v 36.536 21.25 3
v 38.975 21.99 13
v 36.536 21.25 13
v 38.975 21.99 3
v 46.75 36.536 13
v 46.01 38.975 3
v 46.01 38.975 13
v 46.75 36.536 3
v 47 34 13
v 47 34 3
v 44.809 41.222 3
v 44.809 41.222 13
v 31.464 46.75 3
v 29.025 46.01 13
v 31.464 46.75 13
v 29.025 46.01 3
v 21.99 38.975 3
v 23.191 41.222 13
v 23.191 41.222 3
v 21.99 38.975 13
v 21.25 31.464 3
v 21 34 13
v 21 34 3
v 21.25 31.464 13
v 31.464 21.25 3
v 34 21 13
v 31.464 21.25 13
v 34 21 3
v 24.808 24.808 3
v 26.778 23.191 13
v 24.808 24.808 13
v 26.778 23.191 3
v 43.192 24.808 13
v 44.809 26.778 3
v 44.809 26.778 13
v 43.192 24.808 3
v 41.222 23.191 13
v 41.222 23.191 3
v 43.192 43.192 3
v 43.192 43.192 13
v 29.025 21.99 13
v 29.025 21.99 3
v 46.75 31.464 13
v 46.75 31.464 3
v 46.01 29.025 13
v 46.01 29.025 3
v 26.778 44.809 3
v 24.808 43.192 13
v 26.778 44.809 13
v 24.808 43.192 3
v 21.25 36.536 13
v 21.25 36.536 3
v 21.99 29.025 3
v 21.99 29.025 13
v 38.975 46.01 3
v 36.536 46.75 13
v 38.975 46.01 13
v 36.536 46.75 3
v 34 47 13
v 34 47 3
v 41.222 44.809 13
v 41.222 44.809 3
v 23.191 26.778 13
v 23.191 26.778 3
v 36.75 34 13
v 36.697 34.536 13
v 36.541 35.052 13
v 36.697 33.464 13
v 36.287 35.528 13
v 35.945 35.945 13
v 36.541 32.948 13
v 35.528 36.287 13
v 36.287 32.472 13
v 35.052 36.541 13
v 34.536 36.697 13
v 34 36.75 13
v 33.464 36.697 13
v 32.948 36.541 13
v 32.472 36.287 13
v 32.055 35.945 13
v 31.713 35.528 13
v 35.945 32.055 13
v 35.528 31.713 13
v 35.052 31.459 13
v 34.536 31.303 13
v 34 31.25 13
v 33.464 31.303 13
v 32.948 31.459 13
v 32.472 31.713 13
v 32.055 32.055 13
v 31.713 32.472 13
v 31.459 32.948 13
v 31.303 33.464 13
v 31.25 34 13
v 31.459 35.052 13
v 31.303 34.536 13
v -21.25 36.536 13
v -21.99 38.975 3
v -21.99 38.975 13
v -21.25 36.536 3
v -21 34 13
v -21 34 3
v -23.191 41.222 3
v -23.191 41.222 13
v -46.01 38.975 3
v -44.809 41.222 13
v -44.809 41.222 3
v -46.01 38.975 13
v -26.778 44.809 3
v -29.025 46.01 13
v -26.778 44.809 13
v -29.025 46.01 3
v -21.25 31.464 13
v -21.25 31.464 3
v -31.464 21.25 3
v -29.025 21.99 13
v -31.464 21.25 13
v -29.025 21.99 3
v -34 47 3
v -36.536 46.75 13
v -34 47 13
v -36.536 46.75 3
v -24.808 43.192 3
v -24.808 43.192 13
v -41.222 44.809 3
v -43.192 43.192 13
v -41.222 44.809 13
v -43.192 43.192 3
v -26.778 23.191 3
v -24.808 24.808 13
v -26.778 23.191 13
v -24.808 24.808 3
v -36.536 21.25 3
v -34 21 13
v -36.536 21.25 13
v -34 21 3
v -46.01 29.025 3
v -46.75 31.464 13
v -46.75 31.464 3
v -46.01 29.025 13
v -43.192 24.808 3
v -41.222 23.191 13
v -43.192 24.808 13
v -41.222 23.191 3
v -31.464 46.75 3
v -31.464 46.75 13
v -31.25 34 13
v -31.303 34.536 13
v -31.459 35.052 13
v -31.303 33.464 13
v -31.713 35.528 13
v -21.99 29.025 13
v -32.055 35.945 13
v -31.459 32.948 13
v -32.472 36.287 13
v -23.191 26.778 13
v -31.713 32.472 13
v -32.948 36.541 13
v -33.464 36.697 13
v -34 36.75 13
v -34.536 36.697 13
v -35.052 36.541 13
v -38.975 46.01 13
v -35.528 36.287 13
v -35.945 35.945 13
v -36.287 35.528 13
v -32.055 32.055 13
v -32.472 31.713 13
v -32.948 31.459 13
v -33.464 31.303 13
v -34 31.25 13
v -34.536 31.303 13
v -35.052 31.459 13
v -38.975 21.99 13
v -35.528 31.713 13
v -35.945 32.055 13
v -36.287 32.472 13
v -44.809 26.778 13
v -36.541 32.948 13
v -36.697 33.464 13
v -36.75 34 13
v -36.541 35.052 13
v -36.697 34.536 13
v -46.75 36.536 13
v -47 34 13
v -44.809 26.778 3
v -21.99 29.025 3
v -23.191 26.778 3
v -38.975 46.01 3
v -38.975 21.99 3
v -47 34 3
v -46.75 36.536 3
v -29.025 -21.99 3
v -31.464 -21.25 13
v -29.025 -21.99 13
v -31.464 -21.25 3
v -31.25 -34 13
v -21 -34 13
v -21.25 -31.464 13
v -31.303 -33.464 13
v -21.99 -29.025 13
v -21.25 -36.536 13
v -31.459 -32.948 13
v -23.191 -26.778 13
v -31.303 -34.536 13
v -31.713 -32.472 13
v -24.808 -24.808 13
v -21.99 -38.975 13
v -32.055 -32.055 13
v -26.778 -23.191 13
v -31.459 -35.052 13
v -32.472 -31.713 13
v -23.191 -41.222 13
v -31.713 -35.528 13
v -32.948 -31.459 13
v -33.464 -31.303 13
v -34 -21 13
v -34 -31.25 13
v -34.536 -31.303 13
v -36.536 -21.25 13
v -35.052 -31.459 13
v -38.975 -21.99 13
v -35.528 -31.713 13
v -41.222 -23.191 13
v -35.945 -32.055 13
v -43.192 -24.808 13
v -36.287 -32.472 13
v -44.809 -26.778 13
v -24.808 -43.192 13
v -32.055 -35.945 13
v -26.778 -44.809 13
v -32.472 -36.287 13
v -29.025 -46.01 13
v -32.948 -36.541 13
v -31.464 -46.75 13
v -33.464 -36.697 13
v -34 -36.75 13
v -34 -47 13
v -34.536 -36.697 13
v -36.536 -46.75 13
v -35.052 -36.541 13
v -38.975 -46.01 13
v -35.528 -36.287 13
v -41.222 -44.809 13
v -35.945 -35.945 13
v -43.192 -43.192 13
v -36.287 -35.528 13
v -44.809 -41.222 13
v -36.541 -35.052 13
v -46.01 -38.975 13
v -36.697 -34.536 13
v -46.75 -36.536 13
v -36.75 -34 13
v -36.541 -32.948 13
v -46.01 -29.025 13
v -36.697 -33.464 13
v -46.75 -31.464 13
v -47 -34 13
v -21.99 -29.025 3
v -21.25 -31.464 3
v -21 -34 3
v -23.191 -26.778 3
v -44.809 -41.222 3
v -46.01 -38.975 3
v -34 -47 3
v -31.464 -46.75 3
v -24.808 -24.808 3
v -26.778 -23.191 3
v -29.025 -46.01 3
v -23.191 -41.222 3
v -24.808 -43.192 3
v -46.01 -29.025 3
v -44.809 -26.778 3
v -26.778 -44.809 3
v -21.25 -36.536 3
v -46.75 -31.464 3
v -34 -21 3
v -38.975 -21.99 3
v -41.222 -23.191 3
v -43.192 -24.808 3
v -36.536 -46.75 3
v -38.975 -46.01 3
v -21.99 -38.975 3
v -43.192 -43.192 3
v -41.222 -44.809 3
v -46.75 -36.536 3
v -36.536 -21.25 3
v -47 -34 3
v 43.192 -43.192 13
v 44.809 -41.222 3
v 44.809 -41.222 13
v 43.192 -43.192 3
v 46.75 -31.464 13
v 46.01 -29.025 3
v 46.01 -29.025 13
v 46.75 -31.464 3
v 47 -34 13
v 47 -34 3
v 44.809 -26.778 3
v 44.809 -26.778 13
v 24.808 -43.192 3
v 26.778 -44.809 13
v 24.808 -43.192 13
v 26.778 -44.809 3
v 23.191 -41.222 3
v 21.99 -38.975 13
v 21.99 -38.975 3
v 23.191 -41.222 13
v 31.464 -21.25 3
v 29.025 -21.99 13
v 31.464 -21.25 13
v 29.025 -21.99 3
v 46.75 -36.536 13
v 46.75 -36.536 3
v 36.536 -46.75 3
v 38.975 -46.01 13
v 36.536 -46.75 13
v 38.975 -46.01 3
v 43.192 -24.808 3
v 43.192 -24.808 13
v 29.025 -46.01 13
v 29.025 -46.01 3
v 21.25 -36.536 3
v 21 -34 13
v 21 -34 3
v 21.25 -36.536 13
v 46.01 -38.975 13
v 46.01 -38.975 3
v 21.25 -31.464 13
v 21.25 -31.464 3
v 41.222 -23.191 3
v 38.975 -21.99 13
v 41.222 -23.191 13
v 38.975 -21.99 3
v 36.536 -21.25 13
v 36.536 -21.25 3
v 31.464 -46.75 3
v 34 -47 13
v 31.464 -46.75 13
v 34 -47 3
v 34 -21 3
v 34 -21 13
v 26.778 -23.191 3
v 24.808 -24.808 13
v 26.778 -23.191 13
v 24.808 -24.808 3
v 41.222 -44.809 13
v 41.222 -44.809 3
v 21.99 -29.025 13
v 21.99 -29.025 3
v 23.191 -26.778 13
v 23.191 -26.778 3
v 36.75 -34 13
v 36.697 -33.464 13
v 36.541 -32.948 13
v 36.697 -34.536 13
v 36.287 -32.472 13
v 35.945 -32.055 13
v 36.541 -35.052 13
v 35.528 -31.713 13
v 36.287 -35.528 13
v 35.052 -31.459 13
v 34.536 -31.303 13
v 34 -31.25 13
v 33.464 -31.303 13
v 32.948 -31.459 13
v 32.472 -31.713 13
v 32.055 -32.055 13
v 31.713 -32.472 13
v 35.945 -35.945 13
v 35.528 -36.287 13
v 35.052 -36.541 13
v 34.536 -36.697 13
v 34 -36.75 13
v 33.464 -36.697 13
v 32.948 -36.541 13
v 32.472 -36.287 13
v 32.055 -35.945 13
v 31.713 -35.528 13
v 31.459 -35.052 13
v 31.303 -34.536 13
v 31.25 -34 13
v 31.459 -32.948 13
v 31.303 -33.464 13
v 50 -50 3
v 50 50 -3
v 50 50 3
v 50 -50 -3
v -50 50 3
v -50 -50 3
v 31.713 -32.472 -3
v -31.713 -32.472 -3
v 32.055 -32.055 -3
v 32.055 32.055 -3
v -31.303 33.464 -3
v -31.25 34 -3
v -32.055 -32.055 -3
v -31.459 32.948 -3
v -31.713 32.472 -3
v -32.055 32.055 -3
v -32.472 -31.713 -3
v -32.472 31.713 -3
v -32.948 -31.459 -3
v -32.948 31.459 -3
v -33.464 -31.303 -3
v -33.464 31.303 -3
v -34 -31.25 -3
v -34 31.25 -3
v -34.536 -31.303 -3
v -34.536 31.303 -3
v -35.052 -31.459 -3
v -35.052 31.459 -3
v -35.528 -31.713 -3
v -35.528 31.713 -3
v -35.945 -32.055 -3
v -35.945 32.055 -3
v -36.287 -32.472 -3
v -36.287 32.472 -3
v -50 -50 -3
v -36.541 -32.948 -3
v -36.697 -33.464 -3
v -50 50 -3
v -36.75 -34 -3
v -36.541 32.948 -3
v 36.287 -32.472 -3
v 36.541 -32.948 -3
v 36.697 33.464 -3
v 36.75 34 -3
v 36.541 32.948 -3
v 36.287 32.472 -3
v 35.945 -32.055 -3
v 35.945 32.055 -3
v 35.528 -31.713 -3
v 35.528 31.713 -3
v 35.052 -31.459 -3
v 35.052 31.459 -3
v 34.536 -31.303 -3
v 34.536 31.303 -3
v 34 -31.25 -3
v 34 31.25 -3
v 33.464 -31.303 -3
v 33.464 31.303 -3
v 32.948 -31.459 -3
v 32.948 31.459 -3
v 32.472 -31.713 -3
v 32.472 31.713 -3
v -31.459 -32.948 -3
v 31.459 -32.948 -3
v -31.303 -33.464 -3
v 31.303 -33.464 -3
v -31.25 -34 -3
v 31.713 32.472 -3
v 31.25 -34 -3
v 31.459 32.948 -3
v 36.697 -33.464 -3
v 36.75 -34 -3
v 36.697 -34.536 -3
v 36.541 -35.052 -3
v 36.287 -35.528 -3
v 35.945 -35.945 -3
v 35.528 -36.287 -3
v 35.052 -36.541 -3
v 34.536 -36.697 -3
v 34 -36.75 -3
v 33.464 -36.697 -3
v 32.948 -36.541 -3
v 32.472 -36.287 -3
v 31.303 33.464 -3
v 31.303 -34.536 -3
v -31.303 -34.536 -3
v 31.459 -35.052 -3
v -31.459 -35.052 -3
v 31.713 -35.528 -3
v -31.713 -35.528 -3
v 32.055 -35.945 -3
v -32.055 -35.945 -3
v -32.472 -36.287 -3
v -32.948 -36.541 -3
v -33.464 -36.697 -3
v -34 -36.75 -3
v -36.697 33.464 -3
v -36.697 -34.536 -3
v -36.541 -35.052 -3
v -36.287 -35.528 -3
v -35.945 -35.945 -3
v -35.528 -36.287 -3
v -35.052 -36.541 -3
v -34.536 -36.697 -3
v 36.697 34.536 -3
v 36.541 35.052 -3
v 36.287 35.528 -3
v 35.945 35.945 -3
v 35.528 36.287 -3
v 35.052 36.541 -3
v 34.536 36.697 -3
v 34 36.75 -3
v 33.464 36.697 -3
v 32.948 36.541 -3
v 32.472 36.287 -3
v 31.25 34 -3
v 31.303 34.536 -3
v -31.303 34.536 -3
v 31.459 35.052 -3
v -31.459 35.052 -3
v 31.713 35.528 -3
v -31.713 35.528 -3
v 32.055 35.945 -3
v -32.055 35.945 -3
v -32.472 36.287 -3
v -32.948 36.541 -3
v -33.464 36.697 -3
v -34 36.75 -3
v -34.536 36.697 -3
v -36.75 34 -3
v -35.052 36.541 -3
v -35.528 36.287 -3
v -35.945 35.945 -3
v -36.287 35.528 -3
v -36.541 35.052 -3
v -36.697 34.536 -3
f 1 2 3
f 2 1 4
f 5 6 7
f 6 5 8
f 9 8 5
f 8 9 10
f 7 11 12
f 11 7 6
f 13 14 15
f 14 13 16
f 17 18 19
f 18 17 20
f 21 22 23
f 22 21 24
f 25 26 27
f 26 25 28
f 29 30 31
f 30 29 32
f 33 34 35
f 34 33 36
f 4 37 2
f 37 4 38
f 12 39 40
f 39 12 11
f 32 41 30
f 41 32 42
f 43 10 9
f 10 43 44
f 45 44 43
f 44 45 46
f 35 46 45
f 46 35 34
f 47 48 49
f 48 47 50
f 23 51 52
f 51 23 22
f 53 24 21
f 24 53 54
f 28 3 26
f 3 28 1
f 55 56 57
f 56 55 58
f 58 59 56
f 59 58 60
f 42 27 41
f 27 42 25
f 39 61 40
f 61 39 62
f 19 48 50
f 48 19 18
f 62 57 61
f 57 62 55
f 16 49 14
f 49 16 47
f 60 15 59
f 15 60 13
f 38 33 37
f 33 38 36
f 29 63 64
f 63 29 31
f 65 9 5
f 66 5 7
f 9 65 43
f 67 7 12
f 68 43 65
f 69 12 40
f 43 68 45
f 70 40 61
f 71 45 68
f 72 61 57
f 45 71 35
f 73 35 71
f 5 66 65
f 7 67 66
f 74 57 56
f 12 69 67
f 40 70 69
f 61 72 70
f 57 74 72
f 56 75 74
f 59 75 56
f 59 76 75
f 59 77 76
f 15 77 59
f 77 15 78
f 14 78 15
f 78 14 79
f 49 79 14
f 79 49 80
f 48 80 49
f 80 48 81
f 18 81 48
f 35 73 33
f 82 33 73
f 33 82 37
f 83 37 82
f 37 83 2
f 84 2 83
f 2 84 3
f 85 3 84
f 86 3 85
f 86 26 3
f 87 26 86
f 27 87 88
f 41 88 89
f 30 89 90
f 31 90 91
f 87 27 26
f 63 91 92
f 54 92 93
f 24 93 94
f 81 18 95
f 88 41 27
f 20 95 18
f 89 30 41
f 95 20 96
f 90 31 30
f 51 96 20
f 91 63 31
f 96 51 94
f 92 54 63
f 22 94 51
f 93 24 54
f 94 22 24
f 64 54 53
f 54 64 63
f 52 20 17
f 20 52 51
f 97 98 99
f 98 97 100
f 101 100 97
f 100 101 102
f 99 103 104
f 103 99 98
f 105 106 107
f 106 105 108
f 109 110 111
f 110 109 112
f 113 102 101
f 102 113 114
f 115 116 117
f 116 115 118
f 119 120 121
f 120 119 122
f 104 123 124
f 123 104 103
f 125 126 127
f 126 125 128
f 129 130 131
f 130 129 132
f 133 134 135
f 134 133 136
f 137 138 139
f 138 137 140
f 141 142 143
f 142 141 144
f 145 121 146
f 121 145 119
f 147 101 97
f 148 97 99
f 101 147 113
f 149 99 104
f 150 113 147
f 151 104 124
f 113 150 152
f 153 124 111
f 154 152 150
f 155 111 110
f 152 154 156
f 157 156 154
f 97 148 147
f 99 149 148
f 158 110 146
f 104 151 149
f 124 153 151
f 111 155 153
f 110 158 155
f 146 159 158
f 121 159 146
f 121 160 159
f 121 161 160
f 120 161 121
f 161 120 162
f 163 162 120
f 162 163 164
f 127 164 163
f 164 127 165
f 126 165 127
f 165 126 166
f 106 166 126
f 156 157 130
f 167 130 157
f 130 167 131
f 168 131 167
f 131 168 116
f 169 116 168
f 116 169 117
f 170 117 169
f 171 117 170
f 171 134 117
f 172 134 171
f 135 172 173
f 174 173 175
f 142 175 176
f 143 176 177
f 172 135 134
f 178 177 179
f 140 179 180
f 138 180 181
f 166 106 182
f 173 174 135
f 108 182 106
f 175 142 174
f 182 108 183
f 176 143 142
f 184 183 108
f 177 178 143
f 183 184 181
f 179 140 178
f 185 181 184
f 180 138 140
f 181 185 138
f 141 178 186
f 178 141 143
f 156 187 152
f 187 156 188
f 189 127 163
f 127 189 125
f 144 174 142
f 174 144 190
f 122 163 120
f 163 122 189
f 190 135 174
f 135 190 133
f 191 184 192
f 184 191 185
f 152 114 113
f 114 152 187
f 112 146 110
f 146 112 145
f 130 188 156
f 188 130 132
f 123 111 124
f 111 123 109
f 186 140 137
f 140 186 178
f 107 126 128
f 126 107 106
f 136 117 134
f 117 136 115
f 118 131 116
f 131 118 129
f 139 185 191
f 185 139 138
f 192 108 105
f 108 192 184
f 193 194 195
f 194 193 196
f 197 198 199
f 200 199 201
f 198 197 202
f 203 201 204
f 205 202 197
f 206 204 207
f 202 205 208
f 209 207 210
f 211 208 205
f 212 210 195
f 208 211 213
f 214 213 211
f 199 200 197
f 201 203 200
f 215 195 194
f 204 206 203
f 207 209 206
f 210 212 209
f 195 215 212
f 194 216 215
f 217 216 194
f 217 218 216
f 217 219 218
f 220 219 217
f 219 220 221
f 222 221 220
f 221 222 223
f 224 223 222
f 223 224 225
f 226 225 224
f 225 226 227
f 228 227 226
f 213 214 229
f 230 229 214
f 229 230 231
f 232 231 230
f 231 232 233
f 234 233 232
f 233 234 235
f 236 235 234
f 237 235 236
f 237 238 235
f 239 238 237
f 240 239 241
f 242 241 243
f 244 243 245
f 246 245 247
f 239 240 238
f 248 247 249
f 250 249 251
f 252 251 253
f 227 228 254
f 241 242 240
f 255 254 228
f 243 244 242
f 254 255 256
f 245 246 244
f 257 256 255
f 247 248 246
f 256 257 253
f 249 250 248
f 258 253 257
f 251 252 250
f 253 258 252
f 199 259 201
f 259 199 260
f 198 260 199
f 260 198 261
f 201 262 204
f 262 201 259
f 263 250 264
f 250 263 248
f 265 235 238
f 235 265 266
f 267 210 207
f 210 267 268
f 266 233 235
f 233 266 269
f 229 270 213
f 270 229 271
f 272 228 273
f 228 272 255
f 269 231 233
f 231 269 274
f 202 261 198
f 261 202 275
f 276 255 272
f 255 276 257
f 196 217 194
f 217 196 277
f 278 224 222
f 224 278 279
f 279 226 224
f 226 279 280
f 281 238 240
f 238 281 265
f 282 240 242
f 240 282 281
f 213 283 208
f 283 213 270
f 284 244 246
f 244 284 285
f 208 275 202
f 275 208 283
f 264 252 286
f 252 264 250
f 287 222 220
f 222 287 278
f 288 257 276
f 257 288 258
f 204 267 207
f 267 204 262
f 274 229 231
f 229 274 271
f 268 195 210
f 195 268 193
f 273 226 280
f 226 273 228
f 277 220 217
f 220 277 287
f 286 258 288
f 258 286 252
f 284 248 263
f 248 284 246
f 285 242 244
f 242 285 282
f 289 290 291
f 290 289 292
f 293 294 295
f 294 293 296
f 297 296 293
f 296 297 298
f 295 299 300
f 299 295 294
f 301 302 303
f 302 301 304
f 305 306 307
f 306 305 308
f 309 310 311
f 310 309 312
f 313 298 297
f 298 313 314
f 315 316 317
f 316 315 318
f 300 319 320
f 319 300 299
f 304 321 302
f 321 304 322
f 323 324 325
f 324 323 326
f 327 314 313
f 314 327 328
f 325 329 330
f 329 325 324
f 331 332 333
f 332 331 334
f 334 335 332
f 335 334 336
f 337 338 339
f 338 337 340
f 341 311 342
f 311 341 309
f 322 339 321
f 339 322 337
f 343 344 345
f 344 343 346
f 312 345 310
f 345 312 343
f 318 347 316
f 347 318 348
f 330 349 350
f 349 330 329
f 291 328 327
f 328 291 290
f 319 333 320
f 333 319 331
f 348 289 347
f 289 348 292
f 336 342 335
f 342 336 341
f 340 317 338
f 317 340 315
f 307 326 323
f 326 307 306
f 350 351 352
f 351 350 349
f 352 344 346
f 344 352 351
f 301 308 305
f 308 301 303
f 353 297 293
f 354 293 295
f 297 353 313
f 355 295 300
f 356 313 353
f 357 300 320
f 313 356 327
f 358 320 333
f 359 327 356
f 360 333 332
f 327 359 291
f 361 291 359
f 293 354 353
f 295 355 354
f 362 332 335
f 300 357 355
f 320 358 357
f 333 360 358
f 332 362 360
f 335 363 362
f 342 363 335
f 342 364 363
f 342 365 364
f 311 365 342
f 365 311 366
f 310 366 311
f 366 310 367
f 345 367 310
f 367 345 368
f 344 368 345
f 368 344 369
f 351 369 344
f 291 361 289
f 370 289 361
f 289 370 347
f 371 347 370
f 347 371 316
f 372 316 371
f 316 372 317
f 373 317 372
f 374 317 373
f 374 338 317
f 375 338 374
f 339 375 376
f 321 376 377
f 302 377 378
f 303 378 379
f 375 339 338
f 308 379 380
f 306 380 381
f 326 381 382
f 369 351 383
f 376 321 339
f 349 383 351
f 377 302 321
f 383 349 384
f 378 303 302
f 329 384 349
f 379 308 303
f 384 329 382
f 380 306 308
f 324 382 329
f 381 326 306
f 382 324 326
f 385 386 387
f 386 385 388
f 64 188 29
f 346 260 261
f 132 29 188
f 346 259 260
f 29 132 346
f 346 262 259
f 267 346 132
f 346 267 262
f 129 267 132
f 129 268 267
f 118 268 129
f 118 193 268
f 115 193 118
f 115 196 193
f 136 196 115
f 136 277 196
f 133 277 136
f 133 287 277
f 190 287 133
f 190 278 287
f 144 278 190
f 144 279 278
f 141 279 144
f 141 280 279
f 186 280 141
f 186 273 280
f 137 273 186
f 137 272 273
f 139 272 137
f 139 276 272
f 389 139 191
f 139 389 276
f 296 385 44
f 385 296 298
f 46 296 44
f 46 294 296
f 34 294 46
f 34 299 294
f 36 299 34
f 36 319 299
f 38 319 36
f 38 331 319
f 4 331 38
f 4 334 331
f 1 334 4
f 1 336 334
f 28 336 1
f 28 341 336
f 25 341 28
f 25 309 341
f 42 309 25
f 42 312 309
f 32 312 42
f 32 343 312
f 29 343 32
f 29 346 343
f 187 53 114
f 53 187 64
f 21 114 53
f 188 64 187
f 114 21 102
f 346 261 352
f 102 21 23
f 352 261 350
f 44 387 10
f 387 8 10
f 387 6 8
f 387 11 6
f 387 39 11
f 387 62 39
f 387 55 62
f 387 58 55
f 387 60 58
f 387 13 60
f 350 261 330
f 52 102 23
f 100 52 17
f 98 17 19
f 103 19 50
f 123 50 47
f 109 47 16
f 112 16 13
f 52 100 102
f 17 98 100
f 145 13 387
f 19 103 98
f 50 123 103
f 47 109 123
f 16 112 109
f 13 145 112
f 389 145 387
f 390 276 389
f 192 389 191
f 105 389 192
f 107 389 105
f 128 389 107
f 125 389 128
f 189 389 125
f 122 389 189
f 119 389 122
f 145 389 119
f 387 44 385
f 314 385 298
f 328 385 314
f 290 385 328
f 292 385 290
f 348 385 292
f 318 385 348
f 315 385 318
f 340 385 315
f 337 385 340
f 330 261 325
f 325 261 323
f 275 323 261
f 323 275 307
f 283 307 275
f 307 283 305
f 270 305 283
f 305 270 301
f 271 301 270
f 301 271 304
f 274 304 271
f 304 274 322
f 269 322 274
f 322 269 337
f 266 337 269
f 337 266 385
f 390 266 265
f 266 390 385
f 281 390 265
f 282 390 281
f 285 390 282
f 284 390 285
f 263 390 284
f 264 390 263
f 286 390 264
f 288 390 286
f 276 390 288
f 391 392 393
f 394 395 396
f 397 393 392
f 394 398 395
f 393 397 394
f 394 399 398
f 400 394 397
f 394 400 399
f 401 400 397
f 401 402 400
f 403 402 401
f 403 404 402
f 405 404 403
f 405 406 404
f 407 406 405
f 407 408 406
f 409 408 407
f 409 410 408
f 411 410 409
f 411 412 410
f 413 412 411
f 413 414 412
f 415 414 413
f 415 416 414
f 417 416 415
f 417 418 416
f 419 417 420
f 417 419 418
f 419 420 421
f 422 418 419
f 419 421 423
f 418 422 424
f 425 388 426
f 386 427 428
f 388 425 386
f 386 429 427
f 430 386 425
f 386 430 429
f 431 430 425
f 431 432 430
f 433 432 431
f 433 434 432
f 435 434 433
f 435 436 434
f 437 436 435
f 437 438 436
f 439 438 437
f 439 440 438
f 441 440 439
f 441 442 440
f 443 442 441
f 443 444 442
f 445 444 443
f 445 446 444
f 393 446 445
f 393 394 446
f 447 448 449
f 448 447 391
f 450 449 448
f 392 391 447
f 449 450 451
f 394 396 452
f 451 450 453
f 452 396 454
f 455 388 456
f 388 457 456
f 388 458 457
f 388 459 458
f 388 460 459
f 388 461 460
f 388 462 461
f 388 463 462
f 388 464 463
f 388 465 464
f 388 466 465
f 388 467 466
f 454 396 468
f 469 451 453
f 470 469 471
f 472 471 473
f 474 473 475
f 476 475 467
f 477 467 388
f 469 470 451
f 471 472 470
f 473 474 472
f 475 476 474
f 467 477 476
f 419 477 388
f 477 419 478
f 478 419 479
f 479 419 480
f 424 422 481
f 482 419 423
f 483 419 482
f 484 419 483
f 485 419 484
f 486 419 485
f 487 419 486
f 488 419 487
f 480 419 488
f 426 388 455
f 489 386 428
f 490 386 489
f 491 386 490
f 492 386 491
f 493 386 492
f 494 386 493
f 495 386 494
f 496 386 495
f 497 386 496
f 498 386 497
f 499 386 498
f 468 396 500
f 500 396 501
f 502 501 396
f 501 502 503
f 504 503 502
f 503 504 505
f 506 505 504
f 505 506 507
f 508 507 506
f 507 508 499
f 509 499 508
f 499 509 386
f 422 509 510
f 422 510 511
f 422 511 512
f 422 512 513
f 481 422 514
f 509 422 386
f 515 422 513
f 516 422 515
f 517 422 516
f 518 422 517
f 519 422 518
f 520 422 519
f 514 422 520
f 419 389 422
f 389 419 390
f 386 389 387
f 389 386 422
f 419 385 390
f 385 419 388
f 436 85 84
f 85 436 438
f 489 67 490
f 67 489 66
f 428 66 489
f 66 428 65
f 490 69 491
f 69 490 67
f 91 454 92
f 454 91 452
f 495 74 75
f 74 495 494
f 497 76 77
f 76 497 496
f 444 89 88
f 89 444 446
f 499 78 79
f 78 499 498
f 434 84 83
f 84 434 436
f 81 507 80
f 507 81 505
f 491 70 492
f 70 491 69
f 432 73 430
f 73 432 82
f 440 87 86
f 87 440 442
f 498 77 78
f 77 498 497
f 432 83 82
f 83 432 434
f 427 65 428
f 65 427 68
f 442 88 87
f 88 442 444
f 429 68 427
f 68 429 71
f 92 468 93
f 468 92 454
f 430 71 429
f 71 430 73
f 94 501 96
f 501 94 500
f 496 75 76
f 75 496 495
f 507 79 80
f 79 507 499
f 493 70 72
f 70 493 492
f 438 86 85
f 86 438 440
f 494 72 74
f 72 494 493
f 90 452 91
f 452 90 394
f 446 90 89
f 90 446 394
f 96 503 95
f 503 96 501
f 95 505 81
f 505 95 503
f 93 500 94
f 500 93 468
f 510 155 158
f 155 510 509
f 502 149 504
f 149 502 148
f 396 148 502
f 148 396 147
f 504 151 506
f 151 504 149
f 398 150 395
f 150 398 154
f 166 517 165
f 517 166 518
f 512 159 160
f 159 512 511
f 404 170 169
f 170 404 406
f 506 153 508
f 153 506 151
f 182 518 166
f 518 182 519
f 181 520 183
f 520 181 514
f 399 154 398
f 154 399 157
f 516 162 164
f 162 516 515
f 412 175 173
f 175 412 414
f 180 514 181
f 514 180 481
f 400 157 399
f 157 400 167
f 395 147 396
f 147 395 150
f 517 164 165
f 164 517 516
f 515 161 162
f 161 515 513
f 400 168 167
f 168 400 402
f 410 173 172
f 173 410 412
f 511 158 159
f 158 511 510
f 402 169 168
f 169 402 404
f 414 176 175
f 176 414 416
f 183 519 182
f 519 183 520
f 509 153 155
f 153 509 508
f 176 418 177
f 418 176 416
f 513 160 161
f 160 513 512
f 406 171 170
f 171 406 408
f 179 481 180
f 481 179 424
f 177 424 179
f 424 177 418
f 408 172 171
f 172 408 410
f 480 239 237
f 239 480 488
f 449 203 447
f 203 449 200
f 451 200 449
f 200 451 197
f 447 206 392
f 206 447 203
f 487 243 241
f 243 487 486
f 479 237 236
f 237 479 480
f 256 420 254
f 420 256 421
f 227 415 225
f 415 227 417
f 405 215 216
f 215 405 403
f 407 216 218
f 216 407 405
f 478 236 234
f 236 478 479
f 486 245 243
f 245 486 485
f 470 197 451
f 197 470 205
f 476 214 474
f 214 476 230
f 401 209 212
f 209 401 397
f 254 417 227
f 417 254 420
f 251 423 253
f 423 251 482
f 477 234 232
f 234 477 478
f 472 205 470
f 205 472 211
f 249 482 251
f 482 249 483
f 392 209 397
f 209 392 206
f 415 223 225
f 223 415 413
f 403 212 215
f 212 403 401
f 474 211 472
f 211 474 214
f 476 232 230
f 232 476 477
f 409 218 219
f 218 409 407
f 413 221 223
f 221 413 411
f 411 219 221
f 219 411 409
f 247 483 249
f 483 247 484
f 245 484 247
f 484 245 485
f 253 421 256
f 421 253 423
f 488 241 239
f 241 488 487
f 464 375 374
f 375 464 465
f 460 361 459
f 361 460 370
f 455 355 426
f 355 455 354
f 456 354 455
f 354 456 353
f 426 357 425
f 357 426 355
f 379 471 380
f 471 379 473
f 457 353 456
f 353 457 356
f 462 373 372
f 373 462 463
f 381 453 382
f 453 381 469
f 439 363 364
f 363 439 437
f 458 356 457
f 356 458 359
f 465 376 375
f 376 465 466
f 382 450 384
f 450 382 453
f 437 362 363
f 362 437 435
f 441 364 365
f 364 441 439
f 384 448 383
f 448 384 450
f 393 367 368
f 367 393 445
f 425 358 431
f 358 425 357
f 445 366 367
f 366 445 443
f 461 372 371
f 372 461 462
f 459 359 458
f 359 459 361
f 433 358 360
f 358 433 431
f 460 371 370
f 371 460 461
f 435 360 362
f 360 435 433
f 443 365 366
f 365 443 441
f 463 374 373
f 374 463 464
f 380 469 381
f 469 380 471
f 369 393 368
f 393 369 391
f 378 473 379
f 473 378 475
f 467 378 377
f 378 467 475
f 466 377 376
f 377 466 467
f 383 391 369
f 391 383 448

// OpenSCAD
$fn = 32;

// ----------------------------------------------------------------------
// Anchor pads 100 x 100 x 16
// four corner bosses with anchor holes
// ----------------------------------------------------------------------

// --- parameters (mm) ---
plate = [100, 100, 6];  // base plate size (x, y, z)
pads = 4;               // boss count, one per corner
edge = 16;              // boss centre offset from the plate edge
boss_d = 26;            // boss diameter
boss_h = 10;            // boss height above the base plate
hole_d = 5.5;           // hole diameter

// --- derived feature positions (mm) ---
height = plate[2] + boss_h;      // = 16   overall height of the part
corner_x = plate[0] / 2 - edge;  // = 34   boss centre X
corner_y = plate[1] / 2 - edge;  // = 34   boss centre Y
feature_centers = [
  [corner_x, corner_y],
  [-corner_x, corner_y],
  [-corner_x, -corner_y],
  [corner_x, -corner_y]
];   // boss centres, anchor holes are drilled there

// base plate, four bosses standing on it, anchor holes all the way through
difference() {
  union() {
    cube(plate, center = true);
    for (centre = feature_centers)
      translate([centre[0], centre[1], plate[2] / 2 - 1])
        cylinder(d = boss_d, h = boss_h + 1);
  }
  for (centre = feature_centers)
    translate([centre[0], centre[1], -height])
      cylinder(d = hole_d, h = 2 * height + 2);  // through boss and plate
}
